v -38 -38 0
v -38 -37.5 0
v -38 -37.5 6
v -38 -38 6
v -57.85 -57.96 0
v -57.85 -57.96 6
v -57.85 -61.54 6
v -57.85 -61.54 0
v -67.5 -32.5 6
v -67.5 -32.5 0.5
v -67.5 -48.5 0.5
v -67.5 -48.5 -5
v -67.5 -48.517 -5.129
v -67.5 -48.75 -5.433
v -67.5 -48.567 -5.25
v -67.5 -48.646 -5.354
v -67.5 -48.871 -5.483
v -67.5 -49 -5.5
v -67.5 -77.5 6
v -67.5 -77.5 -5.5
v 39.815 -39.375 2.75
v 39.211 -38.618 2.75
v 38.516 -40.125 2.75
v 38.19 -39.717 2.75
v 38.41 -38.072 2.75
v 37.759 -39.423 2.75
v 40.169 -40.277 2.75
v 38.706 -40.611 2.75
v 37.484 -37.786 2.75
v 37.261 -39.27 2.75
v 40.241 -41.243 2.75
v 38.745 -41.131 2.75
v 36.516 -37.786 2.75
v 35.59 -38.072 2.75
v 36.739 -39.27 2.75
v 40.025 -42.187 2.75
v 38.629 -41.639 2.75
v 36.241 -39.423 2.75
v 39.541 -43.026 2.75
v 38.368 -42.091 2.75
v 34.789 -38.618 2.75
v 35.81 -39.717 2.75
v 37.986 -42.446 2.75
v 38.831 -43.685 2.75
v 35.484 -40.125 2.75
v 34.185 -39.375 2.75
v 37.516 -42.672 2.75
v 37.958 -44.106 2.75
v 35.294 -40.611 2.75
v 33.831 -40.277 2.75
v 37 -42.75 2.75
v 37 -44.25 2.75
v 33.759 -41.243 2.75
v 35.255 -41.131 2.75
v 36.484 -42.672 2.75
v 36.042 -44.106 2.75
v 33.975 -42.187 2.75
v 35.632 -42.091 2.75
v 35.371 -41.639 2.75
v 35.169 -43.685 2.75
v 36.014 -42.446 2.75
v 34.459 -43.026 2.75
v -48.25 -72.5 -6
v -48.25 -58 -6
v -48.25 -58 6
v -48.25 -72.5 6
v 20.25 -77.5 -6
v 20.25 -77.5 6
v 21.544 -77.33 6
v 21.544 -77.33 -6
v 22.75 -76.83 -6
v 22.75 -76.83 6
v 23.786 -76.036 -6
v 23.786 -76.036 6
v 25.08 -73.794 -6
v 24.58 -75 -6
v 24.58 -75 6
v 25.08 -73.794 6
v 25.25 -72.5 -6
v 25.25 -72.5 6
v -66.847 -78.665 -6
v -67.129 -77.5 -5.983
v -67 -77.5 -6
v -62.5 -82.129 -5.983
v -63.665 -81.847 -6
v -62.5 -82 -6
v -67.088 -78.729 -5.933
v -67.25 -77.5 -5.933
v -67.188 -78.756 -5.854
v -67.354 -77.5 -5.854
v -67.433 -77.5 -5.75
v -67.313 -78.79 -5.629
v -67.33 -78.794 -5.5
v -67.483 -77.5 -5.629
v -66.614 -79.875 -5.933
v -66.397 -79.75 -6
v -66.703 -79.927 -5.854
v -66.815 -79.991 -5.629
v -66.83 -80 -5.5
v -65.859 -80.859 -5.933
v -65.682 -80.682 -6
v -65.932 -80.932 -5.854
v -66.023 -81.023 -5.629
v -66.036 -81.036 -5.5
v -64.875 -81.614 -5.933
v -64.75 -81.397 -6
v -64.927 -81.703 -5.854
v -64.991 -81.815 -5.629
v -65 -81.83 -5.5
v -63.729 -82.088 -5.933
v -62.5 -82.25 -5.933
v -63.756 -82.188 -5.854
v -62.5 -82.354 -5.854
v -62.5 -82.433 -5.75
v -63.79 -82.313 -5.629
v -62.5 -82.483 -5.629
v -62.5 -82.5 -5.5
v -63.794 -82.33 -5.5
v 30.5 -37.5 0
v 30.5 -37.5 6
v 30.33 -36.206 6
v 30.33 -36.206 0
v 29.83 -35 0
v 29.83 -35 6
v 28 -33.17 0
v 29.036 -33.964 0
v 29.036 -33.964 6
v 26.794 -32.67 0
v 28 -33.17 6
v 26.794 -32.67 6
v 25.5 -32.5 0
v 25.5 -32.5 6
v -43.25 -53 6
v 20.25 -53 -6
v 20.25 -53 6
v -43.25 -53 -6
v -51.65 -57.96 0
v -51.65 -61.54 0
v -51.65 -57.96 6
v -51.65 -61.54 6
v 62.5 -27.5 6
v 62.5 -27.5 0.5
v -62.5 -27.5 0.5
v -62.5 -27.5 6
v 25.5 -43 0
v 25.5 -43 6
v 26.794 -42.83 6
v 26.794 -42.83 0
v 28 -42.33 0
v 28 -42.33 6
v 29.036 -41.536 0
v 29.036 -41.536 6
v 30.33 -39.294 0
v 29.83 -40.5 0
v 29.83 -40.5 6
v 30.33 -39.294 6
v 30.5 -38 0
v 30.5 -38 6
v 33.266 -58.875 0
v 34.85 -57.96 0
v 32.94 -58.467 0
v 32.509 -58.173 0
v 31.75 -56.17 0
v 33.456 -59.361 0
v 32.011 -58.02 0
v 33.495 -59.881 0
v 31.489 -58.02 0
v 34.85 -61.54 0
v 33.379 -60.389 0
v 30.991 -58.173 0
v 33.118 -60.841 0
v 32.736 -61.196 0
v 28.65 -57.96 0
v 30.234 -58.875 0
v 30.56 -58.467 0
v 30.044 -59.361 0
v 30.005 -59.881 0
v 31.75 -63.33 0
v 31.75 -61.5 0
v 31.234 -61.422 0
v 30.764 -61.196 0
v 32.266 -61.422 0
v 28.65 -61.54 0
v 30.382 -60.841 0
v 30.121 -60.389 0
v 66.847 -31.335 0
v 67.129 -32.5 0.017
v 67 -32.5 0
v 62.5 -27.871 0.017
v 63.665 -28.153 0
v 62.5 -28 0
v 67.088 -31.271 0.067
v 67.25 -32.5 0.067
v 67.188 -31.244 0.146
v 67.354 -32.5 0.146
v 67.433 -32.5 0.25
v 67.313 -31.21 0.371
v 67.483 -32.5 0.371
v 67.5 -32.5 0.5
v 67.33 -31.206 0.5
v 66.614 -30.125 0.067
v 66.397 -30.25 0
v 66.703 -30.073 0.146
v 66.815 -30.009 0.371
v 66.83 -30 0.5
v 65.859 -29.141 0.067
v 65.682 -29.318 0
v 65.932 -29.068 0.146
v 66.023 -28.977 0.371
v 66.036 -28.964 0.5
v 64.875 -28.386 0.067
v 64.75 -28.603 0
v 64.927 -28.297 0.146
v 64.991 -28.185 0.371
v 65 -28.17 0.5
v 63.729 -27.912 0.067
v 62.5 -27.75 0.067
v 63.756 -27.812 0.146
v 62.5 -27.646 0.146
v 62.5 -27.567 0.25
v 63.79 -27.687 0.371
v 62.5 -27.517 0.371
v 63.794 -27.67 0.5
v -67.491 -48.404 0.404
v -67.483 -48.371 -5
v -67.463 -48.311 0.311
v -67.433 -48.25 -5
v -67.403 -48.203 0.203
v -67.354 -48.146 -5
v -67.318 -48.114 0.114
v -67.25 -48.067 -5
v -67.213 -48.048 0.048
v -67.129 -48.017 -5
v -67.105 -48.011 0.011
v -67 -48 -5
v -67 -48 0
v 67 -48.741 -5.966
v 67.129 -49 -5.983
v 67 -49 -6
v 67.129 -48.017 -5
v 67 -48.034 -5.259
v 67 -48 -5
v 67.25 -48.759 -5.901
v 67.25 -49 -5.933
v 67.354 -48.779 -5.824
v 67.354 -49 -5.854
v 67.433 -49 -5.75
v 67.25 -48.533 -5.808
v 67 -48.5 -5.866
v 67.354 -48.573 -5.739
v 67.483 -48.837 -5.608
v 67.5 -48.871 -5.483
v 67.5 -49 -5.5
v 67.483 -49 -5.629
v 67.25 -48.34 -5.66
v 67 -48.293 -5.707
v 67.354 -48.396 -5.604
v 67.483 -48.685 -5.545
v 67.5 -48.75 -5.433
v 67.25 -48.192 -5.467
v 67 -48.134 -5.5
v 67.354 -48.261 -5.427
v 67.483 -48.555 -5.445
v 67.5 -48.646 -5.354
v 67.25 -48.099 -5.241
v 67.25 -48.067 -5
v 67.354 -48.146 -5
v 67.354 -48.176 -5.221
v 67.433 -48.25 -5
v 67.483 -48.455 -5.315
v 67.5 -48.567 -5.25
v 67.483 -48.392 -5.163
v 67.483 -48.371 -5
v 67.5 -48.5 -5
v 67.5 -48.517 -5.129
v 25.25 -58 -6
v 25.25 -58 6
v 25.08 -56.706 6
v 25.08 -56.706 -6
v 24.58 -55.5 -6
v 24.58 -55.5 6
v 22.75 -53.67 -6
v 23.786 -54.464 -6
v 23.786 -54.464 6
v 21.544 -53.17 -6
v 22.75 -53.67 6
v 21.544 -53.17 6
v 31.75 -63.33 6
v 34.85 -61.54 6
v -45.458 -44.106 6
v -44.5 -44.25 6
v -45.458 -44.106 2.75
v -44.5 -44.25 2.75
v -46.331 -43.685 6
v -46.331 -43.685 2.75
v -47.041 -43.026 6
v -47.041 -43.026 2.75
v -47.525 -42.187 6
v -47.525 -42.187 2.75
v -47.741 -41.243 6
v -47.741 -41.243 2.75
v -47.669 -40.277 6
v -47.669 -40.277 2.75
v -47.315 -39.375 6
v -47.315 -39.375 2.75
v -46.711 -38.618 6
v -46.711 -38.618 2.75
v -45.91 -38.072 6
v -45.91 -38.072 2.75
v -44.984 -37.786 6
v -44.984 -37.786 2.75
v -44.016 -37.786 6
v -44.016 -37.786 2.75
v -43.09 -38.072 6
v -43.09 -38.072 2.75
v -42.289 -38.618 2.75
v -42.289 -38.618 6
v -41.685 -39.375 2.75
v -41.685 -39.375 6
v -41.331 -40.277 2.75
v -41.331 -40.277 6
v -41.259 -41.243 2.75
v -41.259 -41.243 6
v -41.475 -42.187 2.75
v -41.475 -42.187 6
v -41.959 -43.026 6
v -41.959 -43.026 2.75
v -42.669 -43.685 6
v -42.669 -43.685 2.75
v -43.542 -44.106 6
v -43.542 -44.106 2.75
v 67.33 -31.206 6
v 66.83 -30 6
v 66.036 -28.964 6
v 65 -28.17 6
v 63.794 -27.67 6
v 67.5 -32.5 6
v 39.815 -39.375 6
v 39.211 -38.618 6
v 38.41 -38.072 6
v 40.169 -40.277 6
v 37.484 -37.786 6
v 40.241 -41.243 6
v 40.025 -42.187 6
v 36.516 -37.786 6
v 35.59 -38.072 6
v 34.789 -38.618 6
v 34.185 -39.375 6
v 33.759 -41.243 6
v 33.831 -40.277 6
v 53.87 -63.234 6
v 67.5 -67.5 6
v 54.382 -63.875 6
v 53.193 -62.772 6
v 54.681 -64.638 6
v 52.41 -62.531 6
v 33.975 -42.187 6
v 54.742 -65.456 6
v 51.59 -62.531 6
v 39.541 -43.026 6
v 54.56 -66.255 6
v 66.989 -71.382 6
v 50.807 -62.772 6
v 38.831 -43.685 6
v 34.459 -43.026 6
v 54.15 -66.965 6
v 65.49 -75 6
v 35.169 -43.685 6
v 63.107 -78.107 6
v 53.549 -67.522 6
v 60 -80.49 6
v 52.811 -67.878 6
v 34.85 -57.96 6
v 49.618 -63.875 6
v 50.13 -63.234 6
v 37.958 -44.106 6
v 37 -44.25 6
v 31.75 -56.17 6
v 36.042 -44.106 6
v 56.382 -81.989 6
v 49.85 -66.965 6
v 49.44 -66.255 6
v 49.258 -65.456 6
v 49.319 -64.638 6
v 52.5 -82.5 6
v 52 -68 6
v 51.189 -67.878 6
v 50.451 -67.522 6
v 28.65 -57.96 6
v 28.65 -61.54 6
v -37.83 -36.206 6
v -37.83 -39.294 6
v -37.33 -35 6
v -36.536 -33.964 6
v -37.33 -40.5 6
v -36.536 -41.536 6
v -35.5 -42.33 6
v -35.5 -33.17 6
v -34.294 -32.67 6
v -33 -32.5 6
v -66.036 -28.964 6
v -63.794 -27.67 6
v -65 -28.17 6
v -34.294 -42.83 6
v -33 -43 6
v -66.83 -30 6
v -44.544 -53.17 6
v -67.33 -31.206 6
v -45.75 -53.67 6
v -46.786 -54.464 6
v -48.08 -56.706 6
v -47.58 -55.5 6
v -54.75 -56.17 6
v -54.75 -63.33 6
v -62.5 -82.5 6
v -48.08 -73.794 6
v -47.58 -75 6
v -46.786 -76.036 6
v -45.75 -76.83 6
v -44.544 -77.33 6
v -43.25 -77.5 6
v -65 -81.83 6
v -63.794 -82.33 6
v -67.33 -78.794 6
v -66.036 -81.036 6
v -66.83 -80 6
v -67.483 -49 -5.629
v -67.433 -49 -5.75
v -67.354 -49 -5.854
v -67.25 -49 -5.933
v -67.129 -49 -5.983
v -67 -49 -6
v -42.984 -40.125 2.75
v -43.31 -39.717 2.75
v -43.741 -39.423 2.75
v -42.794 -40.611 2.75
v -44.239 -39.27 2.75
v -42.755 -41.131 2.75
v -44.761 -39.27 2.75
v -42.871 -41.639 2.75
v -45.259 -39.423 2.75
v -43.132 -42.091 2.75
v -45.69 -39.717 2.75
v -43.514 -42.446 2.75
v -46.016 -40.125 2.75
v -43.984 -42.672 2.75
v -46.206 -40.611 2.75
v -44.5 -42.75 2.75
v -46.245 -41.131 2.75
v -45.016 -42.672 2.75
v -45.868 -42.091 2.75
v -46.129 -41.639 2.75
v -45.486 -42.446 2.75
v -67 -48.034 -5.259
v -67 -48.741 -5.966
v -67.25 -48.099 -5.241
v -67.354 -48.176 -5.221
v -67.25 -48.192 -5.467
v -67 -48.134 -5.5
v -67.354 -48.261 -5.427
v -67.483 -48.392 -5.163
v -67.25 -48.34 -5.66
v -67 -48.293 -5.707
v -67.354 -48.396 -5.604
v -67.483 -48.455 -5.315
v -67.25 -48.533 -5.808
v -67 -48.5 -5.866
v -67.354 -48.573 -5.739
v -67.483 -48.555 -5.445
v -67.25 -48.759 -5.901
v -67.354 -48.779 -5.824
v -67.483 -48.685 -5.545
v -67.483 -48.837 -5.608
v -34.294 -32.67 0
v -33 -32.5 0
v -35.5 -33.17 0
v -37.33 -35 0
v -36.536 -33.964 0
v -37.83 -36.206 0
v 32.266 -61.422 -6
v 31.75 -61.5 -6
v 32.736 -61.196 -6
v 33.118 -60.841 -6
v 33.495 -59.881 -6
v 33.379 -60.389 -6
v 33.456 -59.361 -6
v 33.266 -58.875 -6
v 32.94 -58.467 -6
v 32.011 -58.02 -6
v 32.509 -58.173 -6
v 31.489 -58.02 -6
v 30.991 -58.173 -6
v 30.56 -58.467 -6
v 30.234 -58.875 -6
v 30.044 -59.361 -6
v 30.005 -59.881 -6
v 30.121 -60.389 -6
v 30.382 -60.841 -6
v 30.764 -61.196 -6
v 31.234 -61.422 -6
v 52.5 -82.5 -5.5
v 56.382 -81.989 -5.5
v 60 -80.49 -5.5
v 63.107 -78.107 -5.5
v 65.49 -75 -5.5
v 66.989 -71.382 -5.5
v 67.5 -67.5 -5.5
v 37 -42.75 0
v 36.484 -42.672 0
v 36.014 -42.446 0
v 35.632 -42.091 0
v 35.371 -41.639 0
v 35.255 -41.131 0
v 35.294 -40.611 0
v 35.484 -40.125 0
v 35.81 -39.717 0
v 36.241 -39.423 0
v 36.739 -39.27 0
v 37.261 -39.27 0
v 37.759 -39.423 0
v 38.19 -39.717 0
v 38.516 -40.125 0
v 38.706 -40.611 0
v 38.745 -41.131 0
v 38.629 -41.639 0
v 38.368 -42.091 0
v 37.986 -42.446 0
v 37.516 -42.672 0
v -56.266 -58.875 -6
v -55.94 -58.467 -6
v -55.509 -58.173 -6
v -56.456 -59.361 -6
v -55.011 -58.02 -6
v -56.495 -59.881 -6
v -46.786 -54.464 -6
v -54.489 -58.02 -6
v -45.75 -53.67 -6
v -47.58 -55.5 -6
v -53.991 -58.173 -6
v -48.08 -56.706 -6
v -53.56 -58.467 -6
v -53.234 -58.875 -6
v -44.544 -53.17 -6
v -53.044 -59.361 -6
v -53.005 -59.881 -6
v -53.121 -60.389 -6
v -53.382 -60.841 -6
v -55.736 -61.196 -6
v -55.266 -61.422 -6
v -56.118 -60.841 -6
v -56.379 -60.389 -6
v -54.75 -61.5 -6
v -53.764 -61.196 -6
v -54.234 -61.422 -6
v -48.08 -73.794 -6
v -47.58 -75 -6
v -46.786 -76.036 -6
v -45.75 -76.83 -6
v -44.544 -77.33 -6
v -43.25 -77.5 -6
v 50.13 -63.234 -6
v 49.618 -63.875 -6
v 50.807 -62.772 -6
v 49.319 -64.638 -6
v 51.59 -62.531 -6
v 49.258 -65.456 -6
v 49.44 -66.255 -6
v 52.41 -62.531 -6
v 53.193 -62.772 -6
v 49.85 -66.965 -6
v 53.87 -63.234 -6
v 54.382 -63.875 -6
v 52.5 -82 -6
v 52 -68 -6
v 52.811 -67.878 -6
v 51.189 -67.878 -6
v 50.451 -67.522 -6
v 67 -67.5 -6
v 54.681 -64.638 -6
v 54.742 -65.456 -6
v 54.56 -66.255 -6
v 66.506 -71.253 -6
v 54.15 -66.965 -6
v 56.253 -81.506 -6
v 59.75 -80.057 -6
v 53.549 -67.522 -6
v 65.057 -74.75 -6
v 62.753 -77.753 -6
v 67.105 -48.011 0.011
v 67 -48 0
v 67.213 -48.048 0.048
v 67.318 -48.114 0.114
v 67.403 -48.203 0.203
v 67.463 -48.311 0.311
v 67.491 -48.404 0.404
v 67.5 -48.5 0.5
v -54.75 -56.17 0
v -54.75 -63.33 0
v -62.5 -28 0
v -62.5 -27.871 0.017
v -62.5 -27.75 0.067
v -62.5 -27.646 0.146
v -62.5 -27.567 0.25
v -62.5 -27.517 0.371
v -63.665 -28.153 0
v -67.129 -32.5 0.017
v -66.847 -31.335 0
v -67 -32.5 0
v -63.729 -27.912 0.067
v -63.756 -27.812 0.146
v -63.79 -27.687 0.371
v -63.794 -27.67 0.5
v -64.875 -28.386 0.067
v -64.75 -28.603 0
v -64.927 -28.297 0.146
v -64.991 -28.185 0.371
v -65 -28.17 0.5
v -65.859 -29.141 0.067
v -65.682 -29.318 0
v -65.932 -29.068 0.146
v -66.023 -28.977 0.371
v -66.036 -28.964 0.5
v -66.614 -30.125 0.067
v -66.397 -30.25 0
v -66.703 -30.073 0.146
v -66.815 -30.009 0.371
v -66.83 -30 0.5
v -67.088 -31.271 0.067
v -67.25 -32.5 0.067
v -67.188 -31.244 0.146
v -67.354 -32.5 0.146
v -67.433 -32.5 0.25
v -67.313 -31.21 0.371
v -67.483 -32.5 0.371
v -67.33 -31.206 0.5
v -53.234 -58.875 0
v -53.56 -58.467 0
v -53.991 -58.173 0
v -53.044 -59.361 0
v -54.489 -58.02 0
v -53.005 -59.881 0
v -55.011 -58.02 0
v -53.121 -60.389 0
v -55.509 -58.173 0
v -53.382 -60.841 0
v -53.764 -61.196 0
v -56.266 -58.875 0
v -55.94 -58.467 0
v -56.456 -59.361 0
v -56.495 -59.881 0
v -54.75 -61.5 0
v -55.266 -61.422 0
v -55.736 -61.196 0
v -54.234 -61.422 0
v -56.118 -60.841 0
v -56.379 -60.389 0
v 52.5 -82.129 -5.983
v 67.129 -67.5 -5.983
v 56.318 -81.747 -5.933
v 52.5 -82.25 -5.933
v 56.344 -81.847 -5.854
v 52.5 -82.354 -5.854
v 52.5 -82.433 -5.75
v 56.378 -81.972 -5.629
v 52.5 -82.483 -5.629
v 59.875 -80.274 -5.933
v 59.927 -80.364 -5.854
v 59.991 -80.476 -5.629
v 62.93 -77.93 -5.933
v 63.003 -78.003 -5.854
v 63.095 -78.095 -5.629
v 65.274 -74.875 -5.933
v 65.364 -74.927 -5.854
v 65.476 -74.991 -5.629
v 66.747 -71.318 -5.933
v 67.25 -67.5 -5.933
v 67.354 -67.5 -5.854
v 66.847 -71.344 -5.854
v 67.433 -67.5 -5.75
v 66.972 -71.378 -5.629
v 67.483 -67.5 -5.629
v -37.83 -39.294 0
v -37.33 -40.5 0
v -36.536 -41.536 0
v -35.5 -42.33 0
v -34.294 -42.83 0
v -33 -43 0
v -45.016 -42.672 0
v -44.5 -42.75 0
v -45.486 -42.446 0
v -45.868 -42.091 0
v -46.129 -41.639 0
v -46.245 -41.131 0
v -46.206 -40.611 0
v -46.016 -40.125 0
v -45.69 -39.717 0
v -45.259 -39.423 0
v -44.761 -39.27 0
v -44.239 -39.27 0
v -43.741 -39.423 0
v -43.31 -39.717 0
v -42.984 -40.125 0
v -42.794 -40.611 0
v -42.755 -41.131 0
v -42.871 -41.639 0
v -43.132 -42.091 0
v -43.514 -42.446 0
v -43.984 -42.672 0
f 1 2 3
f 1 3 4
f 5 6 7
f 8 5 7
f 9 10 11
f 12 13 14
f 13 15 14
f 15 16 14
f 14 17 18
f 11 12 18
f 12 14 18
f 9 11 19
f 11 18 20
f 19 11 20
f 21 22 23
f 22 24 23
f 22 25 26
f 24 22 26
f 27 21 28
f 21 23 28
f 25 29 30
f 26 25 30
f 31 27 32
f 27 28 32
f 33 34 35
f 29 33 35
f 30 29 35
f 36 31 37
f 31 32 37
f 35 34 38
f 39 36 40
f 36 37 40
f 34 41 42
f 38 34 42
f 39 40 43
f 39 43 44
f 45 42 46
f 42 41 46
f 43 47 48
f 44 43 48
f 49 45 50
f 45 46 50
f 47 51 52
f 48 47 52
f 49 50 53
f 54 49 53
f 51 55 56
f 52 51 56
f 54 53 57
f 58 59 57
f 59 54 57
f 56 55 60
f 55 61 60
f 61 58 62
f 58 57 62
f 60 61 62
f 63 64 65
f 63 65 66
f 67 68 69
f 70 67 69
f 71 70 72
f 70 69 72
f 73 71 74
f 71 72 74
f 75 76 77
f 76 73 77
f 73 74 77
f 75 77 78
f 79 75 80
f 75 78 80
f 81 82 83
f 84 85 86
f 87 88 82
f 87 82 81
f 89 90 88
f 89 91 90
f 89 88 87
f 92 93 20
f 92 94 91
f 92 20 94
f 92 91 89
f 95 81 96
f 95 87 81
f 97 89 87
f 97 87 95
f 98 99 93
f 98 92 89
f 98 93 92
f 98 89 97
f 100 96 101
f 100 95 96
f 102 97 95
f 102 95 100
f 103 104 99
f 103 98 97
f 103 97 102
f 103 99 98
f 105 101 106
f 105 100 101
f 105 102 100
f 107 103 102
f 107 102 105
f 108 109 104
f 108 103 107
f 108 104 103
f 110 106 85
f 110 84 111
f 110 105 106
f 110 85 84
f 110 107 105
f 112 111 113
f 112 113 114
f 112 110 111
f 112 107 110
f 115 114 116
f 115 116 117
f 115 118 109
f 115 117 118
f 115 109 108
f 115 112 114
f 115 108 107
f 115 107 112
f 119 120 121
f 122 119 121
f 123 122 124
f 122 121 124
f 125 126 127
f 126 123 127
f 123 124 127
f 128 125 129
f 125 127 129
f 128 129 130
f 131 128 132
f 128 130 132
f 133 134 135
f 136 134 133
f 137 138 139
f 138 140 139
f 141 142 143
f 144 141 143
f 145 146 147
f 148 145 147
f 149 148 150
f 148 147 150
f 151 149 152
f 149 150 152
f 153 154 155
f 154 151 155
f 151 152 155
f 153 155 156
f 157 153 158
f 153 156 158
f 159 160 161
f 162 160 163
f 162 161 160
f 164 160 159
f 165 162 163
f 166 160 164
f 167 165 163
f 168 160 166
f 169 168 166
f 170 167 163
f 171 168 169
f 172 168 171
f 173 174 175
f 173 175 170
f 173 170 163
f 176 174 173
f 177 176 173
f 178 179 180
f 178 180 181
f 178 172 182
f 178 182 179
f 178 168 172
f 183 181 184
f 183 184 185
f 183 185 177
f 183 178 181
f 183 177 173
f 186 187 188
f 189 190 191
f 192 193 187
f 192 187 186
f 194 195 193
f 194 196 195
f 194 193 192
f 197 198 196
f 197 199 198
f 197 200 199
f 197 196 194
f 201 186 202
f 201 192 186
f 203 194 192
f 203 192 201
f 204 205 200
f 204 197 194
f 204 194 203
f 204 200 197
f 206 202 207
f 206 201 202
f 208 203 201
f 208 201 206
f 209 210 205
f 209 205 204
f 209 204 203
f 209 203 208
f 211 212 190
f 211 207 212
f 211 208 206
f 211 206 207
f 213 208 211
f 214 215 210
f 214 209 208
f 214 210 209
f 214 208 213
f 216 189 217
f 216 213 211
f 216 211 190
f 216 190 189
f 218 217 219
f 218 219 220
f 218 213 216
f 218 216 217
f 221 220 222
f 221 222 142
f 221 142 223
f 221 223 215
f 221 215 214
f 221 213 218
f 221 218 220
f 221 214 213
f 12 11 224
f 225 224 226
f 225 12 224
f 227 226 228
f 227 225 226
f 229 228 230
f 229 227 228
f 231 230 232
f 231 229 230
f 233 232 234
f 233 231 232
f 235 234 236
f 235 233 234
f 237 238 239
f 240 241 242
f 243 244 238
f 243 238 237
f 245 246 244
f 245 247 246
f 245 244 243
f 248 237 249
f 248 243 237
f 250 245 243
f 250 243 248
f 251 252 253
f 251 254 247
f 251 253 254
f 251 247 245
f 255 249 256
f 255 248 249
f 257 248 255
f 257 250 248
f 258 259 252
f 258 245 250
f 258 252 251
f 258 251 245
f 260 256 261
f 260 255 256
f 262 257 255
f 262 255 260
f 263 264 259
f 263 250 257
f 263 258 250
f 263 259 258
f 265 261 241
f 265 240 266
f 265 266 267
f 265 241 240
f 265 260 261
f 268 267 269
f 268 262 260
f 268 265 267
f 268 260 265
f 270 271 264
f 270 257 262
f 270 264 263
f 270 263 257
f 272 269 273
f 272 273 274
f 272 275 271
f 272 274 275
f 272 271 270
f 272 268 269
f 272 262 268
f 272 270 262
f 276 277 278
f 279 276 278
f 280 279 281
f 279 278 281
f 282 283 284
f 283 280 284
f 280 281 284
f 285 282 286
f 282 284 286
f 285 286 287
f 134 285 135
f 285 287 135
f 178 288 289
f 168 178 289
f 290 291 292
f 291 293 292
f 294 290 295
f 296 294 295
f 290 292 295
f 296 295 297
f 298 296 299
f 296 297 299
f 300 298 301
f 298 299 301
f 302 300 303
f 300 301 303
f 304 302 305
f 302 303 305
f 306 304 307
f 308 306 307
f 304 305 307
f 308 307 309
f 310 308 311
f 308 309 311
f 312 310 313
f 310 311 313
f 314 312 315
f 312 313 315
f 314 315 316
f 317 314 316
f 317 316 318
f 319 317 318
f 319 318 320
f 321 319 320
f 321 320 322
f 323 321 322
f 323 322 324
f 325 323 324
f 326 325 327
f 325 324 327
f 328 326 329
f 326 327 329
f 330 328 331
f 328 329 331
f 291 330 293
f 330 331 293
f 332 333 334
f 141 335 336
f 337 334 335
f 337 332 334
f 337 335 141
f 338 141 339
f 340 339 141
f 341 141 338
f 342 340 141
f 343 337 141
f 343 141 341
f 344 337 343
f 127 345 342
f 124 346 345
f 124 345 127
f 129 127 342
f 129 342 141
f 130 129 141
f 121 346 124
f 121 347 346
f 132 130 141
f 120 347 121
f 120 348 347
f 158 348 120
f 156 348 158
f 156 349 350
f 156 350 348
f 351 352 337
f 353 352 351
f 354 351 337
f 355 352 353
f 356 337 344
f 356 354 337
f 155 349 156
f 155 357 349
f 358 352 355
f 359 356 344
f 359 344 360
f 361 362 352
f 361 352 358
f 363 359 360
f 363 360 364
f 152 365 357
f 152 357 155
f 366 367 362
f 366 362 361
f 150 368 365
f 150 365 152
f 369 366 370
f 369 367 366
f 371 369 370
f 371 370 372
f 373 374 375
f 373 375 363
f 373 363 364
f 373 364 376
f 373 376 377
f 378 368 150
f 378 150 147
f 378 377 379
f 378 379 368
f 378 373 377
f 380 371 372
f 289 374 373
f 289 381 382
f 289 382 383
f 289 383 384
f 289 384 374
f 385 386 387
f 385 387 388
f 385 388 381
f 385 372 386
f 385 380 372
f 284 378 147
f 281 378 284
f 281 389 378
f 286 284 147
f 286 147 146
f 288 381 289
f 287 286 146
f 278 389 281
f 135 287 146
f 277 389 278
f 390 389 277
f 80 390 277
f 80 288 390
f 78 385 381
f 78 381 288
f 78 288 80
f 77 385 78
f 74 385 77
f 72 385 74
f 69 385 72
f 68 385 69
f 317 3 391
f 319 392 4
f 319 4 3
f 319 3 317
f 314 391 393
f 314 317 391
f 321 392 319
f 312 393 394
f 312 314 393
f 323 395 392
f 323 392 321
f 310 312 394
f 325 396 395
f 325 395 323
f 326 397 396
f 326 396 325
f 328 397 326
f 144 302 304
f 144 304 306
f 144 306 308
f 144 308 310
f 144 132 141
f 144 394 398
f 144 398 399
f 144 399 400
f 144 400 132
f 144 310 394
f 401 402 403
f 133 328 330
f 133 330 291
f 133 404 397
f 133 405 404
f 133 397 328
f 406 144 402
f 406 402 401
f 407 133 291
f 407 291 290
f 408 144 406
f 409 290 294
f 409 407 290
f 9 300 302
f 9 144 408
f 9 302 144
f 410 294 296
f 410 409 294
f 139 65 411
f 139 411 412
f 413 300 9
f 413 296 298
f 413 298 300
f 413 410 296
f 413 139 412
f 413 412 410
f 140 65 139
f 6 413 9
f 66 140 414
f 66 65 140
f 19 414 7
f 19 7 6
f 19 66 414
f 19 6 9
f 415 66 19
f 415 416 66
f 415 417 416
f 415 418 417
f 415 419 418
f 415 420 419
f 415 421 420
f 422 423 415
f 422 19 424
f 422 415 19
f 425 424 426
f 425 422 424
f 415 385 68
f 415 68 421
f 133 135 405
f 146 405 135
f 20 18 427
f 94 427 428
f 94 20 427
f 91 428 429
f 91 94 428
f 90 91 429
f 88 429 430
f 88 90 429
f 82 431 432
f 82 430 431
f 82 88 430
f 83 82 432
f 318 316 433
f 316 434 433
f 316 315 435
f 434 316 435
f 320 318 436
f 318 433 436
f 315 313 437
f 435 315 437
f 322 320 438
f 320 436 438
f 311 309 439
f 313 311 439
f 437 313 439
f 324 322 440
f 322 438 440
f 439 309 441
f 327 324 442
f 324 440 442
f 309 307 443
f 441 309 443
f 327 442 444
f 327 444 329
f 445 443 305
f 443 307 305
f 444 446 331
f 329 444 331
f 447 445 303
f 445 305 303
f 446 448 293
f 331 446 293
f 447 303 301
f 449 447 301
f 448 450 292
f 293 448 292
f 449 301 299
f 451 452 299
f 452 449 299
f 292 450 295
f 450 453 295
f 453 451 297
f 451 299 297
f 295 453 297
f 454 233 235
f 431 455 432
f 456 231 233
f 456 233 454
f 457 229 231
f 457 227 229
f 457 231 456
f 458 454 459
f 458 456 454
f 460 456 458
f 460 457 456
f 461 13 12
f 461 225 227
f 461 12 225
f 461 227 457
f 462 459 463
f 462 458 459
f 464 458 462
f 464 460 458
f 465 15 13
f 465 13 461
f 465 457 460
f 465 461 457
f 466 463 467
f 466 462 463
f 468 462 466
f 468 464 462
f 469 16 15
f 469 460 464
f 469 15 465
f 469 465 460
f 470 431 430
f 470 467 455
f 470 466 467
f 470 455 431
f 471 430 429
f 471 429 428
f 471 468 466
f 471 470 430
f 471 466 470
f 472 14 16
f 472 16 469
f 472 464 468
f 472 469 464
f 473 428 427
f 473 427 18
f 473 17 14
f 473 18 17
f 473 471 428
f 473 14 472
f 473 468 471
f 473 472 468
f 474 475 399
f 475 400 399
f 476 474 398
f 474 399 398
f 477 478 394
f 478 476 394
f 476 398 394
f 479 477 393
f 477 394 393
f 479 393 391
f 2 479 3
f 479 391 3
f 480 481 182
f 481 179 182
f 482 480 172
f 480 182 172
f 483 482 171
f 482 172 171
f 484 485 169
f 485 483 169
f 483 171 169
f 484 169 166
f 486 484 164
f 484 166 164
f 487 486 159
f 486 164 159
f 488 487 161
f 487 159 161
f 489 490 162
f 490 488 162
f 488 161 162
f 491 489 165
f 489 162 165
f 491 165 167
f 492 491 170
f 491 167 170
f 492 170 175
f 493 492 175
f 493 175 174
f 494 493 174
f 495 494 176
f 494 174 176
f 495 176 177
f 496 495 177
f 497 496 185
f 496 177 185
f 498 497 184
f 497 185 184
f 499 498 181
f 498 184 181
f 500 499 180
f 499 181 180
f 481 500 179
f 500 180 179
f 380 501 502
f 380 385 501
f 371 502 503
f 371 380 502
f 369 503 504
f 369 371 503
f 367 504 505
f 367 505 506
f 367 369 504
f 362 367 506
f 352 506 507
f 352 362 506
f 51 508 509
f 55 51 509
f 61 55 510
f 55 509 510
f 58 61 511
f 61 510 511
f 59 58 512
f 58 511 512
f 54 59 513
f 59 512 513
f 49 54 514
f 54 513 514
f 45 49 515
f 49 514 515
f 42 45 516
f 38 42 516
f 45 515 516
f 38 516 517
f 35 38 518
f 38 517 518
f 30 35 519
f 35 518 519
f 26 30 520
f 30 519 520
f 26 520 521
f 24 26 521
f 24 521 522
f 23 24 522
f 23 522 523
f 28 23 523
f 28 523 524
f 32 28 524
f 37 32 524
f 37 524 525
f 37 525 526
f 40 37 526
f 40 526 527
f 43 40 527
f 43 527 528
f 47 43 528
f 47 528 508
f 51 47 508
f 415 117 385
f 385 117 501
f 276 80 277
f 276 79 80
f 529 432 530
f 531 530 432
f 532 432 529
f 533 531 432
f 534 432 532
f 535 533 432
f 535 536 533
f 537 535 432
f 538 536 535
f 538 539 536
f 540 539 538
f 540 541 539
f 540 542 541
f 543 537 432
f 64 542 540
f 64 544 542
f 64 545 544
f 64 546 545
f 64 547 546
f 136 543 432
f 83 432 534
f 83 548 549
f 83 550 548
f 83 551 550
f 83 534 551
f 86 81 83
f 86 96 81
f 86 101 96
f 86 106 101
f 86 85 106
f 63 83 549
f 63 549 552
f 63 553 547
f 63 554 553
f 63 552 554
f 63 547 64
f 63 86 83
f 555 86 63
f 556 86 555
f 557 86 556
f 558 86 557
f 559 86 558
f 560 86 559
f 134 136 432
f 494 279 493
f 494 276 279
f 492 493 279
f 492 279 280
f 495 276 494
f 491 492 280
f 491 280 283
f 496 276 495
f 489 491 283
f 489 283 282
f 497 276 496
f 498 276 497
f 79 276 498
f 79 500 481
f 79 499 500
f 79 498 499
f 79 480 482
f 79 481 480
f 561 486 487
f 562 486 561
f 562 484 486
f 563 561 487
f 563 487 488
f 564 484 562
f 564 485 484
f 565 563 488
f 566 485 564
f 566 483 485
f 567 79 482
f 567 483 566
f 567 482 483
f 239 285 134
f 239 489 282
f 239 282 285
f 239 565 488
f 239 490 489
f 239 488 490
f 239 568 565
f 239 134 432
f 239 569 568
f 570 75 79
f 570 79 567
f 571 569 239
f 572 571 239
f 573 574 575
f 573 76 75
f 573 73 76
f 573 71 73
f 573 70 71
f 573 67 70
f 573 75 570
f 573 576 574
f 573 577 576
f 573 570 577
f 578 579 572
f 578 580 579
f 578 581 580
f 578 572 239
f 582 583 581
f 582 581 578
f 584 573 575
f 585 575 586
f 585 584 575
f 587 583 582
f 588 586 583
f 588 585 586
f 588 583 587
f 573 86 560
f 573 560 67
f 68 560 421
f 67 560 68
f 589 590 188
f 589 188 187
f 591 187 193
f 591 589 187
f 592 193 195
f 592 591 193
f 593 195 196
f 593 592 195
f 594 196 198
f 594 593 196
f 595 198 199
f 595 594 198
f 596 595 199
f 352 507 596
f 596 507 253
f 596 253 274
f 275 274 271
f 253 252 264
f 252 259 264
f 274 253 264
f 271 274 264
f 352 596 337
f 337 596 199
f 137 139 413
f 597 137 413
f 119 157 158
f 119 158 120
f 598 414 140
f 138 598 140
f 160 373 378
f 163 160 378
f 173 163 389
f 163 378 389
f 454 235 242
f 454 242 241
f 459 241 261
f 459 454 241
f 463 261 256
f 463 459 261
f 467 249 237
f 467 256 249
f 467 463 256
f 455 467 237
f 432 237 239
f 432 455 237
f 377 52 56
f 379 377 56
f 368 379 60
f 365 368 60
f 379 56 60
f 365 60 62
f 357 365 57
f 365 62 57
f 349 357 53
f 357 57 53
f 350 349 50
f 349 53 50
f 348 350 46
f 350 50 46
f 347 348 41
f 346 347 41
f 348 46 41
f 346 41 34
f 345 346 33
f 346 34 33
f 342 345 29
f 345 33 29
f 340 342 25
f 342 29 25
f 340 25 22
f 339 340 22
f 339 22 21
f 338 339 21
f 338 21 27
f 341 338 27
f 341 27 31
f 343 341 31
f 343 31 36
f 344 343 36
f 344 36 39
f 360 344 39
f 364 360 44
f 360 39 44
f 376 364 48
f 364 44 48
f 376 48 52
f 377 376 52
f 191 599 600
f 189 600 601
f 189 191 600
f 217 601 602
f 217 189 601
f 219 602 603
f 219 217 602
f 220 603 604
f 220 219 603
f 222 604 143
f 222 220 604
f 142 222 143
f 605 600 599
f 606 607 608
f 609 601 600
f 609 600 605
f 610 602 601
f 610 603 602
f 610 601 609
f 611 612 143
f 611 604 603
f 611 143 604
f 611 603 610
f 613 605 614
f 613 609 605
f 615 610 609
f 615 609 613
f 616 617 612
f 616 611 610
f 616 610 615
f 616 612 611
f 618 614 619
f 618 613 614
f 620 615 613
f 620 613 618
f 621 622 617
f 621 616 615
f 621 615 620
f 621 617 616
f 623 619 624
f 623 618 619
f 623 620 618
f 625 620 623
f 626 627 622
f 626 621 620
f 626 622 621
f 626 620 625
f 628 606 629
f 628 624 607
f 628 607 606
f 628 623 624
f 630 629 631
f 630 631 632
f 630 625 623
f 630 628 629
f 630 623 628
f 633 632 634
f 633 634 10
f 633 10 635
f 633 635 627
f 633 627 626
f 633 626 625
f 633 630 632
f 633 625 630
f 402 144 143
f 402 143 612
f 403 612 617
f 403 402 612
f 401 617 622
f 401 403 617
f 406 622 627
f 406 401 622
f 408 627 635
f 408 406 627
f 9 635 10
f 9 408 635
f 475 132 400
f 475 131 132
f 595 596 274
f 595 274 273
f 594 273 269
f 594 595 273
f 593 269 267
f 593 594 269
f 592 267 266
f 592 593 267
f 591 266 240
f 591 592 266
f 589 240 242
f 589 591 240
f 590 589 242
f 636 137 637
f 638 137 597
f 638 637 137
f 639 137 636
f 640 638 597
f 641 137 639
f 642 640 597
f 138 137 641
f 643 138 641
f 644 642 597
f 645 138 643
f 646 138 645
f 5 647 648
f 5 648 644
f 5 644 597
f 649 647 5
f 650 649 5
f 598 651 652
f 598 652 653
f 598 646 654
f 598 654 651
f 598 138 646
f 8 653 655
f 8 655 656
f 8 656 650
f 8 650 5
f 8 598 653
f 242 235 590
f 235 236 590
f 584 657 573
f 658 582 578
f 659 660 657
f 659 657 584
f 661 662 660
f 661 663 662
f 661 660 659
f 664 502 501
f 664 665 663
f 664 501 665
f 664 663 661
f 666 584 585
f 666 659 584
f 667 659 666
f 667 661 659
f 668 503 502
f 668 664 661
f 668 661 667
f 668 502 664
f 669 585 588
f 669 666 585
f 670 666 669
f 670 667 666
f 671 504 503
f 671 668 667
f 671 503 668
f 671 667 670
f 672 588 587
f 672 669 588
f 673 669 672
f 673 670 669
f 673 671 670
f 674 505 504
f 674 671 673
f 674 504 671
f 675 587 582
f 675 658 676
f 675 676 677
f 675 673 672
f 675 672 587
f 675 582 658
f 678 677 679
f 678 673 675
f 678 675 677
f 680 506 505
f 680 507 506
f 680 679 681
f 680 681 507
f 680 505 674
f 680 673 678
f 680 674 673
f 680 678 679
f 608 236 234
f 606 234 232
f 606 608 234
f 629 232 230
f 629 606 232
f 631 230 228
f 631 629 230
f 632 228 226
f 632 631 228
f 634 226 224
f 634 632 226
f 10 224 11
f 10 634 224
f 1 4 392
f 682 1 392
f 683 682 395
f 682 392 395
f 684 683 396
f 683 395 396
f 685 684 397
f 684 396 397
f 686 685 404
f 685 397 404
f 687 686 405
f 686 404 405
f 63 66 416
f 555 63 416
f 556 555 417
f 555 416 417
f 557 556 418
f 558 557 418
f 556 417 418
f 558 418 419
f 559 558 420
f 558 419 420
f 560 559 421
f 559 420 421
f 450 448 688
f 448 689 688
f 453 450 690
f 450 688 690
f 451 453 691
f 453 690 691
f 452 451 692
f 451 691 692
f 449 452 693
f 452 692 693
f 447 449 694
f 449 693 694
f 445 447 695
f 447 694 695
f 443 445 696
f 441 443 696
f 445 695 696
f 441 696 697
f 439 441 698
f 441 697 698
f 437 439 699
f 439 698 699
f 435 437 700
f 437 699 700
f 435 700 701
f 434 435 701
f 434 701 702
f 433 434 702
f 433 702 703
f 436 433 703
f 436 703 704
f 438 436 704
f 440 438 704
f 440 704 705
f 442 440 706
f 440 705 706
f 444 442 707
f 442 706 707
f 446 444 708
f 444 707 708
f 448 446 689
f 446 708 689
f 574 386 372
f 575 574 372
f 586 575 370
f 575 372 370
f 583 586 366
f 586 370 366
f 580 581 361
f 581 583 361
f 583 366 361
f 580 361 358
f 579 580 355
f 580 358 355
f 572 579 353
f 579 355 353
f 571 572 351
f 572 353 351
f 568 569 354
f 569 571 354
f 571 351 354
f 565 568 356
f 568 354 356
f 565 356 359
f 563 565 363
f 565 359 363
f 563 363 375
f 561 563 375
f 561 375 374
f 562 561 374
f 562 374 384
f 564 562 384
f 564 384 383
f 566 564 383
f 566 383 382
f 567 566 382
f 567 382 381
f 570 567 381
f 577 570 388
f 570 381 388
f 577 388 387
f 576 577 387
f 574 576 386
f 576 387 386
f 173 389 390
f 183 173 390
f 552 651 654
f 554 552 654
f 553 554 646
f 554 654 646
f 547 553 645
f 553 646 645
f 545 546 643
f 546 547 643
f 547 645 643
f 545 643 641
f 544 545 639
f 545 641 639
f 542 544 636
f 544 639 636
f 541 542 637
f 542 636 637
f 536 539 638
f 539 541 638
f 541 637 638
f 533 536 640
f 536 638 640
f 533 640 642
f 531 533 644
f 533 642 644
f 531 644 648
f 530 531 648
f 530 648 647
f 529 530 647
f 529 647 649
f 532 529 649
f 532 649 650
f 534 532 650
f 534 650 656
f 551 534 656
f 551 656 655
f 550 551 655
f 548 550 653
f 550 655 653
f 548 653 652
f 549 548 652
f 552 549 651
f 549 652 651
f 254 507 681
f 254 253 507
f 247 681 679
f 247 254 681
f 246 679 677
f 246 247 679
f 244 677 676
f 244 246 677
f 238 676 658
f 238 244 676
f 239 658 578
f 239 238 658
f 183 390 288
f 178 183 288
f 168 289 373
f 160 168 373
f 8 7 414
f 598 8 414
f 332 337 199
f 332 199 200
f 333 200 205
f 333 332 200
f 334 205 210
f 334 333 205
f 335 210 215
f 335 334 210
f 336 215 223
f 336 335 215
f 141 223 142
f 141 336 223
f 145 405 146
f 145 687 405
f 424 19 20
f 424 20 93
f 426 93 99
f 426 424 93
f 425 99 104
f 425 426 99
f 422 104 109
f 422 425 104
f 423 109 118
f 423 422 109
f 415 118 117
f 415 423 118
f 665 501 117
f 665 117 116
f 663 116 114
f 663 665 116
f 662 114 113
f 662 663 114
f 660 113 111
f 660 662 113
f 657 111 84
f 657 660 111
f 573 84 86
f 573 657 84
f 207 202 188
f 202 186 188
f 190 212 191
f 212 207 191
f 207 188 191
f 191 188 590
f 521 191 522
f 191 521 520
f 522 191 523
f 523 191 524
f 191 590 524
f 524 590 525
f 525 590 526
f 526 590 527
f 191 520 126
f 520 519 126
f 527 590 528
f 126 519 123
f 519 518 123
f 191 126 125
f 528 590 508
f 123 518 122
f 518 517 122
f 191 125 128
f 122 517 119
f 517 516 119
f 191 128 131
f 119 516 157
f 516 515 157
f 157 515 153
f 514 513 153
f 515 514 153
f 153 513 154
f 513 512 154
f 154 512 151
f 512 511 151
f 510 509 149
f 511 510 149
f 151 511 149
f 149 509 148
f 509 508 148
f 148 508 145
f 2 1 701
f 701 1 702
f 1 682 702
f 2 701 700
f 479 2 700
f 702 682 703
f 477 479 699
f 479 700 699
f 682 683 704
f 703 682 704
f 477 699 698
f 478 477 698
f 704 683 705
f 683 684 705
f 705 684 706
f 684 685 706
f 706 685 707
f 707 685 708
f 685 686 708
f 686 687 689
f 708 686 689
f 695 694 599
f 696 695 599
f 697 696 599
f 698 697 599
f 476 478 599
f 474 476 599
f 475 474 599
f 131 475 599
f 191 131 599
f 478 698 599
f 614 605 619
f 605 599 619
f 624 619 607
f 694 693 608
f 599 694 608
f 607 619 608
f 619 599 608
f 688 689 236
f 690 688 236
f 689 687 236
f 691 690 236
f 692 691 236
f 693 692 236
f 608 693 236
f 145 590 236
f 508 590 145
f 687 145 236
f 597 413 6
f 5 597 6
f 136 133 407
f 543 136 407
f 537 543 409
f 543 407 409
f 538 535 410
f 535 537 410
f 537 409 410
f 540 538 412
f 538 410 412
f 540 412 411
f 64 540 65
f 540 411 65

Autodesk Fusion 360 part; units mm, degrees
sketch "Sketch1" plane through (0, 0, 0) normal (0, 0, 1) x (1, 0, 0)
  line L0 (67.5, 27.5) -> (-67.5, 27.5)
  line L1 (-67.5, 27.5) -> (-67.5, -27.5)
  line L2 (-67.5, -27.5) -> (67.5, -27.5)
  line L3 (67.5, -27.5) -> (67.5, 27.5)
  line L4 (67.5, 27.5) -> (-67.5, -27.5) construction
  line L5 (-67.5, 27.5) -> (67.5, -27.5) construction
  dimension "d1" = 55
  dimension "d2" = 135
extrude "Extrude1" add sketch "Sketch1" along normal blind 6 makes body 1
sketch "Sketch3" plane through (0, 0, 0) normal (0, 0, -1) x (-1, 0, 0)
  line L0 (-67.5, 27.5) -> (-67.5, -27.5)
  line L1 (-67.5, -27.5) -> (67.5, -27.5)
  line L2 (67.5, -27.5) -> (67.5, 27.5)
  line L3 (67.5, 27.5) -> (-67.5, 27.5)
  line L4 (-67.5, -7) -> (67.5, -7)
  line L5 (67.5, -7) -> (67.5, 27.5)
  line L6 (67.5, 27.5) -> (-67.5, 27.5)
  line L7 (-67.5, 27.5) -> (-67.5, -7)
  line L8 (-67.5, -7) -> (67.5, 27.5) construction
  line L9 (67.5, -7) -> (-67.5, 27.5) construction
  point P0 (0, 10.25)
  dimension "d14" = 34.5
  dimension "d30" = 20.5
extrude "Extrude2" add sketch "Sketch3" along normal blind 6 contours L0 L2 L3 L4 L5 L6 L7 bodies 1
sketch "Sketch4" plane through (0, 0, -6) normal (0, 0, -1) x (-1, 0, 0)
  line L0 (-67.5, 27.5) -> (-67.5, -7)
  line L1 (-67.5, -7) -> (67.5, -7)
  line L2 (67.5, -7) -> (67.5, 27.5)
  line L3 (67.5, 27.5) -> (-67.5, 27.5)
  line L4 (-67.5, 4.75) -> (67.5, 4.75) construction
  point P0 (54.75, 4.75)
  point P1 (-31.75, 4.75)
  dimension "d19" = 12.75
  dimension "d20" = 86.5
  dimension "d31" = 11.75
hole "Hole2" at (31.75, 4.75, -6) at (-54.75, 4.75, -6) direction (0, 0, 1) diameter 3.5 end through all bodies 1 1
sketch "Sketch5" plane through (0, 0, 6) normal (0, 0, 1) x (1, 0, 0)
  circle A0 centre (31.75, 4.75) radius 1.75
  circle A1 centre (-54.75, 4.75) radius 1.75
  line L0 (67.5, -27.5) -> (67.5, 27.5)
  line L1 (67.5, 27.5) -> (-67.5, 27.5)
  line L2 (-67.5, 27.5) -> (-67.5, -27.5)
  line L3 (-67.5, -27.5) -> (67.5, -27.5)
  line L4 (-51.65, 6.5398) -> (-54.75, 8.3296)
  line L5 (-54.75, 8.3296) -> (-57.85, 6.5398)
  line L6 (-57.85, 6.5398) -> (-57.85, 2.9602)
  line L7 (-57.85, 2.9602) -> (-54.75, 1.1704)
  line L8 (-54.75, 1.1704) -> (-51.65, 2.9602)
  line L9 (-51.65, 2.9602) -> (-51.65, 6.5398)
  line L10 (34.85, 2.9602) -> (34.85, 6.5398)
  line L11 (34.85, 6.5398) -> (31.75, 8.3296)
  line L12 (31.75, 8.3296) -> (28.65, 6.5398)
  line L13 (28.65, 6.5398) -> (28.65, 2.9602)
  line L14 (28.65, 2.9602) -> (31.75, 1.1704)
  line L15 (31.75, 1.1704) -> (34.85, 2.9602)
  point P0 (-54.75, 4.75)
  point P1 (31.75, 4.75)
  dimension "d24" = 6.2
  dimension "d25" = 6.2
extrude "Extrude3" cut sketch "Sketch5" against normal blind 6 contours L4 L5 L6 L7 L8 L9 | L10 L11 L12 L13 L14 L15 bodies 1
sketch "Sketch6" plane through (0, 0, -6) normal (0, 0, -1) x (-1, 0, 0)
  circle A0 centre (-31.75, 4.75) radius 1.75
  circle A1 centre (54.75, 4.75) radius 1.75
  line L0 (-67.5, 27.5) -> (-67.5, -7)
  line L1 (-67.5, -7) -> (67.5, -7)
  line L2 (67.5, -7) -> (67.5, 27.5)
  line L3 (67.5, 27.5) -> (-67.5, 27.5)
  line L4 (59.5, -7) -> (-36.5, -7) construction
  line L5 (-36.5, -7) -> (-36.5, 28) construction
  line L6 (-36.5, 28) -> (59.5, 28) construction
  line L7 (59.5, 28) -> (59.5, -7) construction
  line L8 (59.5, -7) -> (-36.5, 28) construction
  line L9 (-36.5, -7) -> (59.5, 28) construction
  line L10 (11.5, 50.5144) -> (11.5, -41.0982) construction
  line L11 (-52, 27.5) -> (-52, -7) construction
  line L12 (-36.5, 10.25) -> (-67.5, 10.25) construction
  point P0 (11.5, 10.5)
  point P1 (-52, 10.25)
  dimension "d28" = 35
  dimension "d29" = 96
hole "Hole3" at (52, 10.25, -6) direction (0, 0, 1) diameter 5.5 end through all bodies 1 1
fillet "Fillet1" radius 5 2 edges at (67.5, -27.5, 3) (-67.5, -27.5, 3) on bodies 1
fillet "Fillet1" radius 5 1 edges at (-67.5, 27.5, 0) on bodies 1
fillet "Fillet3" radius 15 1 edges at (67.5, 27.5, 0) on bodies 1
ref_plane "WorkPlane1" through (0, -27.5, 3) normal (0, -1, 0) x (1, 0, 0)
mirror "Mirror1" about plane through (0, -27.5, 3) normal (0, -1, 0) of bodies 1 makes body 2
sketch "Sketch8" plane through (0, 0, 6) normal (0, 0, 1) x (1, 0, 0)
  arc A0 (52.5, -82.5) -> (67.5, -67.5) centre (52.5, -67.5) ccw
  line L0 (67.5, -67.5) -> (67.5, -32.5)
  arc A1 (67.5, -32.5) -> (62.5, -27.5) centre (62.5, -32.5) ccw
  line L1 (62.5, -27.5) -> (-62.5, -27.5)
  arc A2 (-62.5, -27.5) -> (-67.5, -32.5) centre (-62.5, -32.5) ccw
  line L2 (-67.5, -32.5) -> (-67.5, -77.5)
  arc A3 (-67.5, -77.5) -> (-62.5, -82.5) centre (-62.5, -77.5) ccw
  line L3 (-62.5, -82.5) -> (52.5, -82.5)
  circle A4 centre (52, -65.25) radius 2.75
  line L4 (-51.65, -61.5398) -> (-54.75, -63.3296)
  line L5 (-54.75, -63.3296) -> (-57.85, -61.5398)
  line L6 (-57.85, -61.5398) -> (-57.85, -57.9602)
  line L7 (-57.85, -57.9602) -> (-54.75, -56.1704)
  line L8 (-54.75, -56.1704) -> (-51.65, -57.9602)
  line L9 (-51.65, -57.9602) -> (-51.65, -61.5398)
  line L10 (34.85, -57.9602) -> (34.85, -61.5398)
  line L11 (34.85, -61.5398) -> (31.75, -63.3296)
  line L12 (31.75, -63.3296) -> (28.65, -61.5398)
  line L13 (28.65, -61.5398) -> (28.65, -57.9602)
  line L14 (28.65, -57.9602) -> (31.75, -56.1704)
  line L15 (31.75, -56.1704) -> (34.85, -57.9602)
  arc A5 (-62.5, -27.5) -> (-67.5, -32.5) centre (-62.5, -32.5) ccw
  line L16 (-62.5, -27.5) -> (62.5, -27.5)
  arc A6 (67.5, -32.5) -> (62.5, -27.5) centre (62.5, -32.5) ccw
  line L17 (67.5, -32.5) -> (67.5, -48)
  line L18 (67.5, -48) -> (-67.5, -48)
  line L19 (-67.5, -48) -> (-67.5, -32.5)
  point P0 (-44.5, -41)
  point P1 (37, -41)
  dimension "d58" = 7
  dimension "d60" = 7
  dimension "d61" = 30.5
  dimension "d67" = 81.5
hole "Hole4" at (-44.5, -41, 6) at (37, -41, 6) direction (0, 0, -1) diameter 3.5 end through all counterbore diameter 6.5 counterbore depth 3.25 bodies 2 2
fillet "Fillet4" radius 1 1 edges at (0, -48, -6) on bodies 2
fillet "Fillet5" radius 0.5 14 edges at (-67.5, -40.25, 0) (-66.0355, -28.9645, 0) (0, -27.5, 0) (66.0355, -28.9645, 0) (67.5, -40.25, 0) (-67.5, -48, -2.5) (-67.5, -48.2929, -5.7071) (-67.5, -63.25, -6) (-66.0355, -81.0355, -6) (-5, -82.5, -6) (63.1066, -78.1066, -6) (67.5, -58.25, -6) (67.5, -48.2929, -5.7071) (67.5, -48, -2.5) on bodies 2
sketch "Sketch9" plane through (0, 0, -6) normal (0, 0, -1) x (-1, 0, 0)
  circle A0 centre (-52, -65.25) radius 2.75
  circle A1 centre (-31.75, -59.75) radius 1.75
  circle A2 centre (54.75, -59.75) radius 1.75
  line L0 (-67, -49) -> (-67, -67.5)
  arc A3 (-67, -67.5) -> (-52.5, -82) centre (-52.5, -67.5) ccw
  line L1 (-52.5, -82) -> (62.5, -82)
  arc A4 (62.5, -82) -> (67, -77.5) centre (62.5, -77.5) ccw
  line L2 (67, -77.5) -> (67, -49)
  line L3 (67, -49) -> (-67, -49)
  line L4 (48.25, -77.5) -> (-25.25, -77.5)
  line L5 (-25.25, -77.5) -> (-25.25, -53)
  line L6 (-25.25, -53) -> (48.25, -53)
  line L7 (48.25, -53) -> (48.25, -77.5)
  line L8 (48.25, -77.5) -> (-25.25, -53) construction
  line L9 (-25.25, -77.5) -> (48.25, -53) construction
  line L10 (67, -48) -> (-67, -48)
  line L11 (-52.5, -82.5) -> (62.5, -82.5)
  point P0 (11.5, -65.25)
  dimension "d68" = 5
  dimension "d69" = 5
  dimension "d71" = 6.5
  dimension "d82" = 6.5
extrude "Extrude4" cut sketch "Sketch9" against normal through all contours L4 L5 L6 L7 bodies 2
fillet "Fillet6" radius 5 4 edges at (25.25, -53, 0) (25.25, -77.5, 0) (-48.25, -77.5, 0) (-48.25, -53, 0) on bodies 2
sketch "Sketch10" plane through (0, 0, 0) normal (0, 0, -1) x (-1, 0, 0)
  line L0 (-67, -32.5) -> (-67, -48)
  line L1 (-67, -48) -> (67, -48)
  line L2 (67, -48) -> (67, -32.5)
  arc A0 (67, -32.5) -> (62.5, -28) centre (62.5, -32.5) ccw
  line L3 (62.5, -28) -> (-62.5, -28)
  arc A1 (-62.5, -28) -> (-67, -32.5) centre (-62.5, -32.5) ccw
  circle A2 centre (44.5, -41) radius 1.75
  circle A3 centre (-37, -41) radius 1.75
  line L4 (38, -43) -> (-30.5, -43)
  line L5 (-30.5, -43) -> (-30.5, -32.5)
  line L6 (-30.5, -32.5) -> (38, -32.5)
  line L7 (38, -32.5) -> (38, -43)
  line L8 (38, -43) -> (-30.5, -32.5) construction
  line L9 (-30.5, -43) -> (38, -32.5) construction
  line L10 (62.5, -27.5) -> (-62.5, -27.5)
  point P0 (3.75, -37.75)
  dimension "d75" = 5
  dimension "d76" = 5
  dimension "d77" = 6.5
  dimension "d78" = 6.5
extrude "Extrude5" cut sketch "Sketch10" against normal through all contours L4 L5 L6 L7 bodies 2
fillet "Fillet7" radius 5 4 edges at (-38, -43, 3) (-38, -32.5, 3) (30.5, -32.5, 3) (30.5, -43, 3) on bodies 2
hidden bodies 1
equation "d19 = 15 mm - 2.25 mm"
equation "d20 = 82 mm + 4.5 mm"
equation "d25 = d24"
equation "d31 = 9.5 mm + 2.25 mm"
equation "d69 = d68"
equation "d71 = d82"
equation "d76 = d75"
equation "d78 = d77"
